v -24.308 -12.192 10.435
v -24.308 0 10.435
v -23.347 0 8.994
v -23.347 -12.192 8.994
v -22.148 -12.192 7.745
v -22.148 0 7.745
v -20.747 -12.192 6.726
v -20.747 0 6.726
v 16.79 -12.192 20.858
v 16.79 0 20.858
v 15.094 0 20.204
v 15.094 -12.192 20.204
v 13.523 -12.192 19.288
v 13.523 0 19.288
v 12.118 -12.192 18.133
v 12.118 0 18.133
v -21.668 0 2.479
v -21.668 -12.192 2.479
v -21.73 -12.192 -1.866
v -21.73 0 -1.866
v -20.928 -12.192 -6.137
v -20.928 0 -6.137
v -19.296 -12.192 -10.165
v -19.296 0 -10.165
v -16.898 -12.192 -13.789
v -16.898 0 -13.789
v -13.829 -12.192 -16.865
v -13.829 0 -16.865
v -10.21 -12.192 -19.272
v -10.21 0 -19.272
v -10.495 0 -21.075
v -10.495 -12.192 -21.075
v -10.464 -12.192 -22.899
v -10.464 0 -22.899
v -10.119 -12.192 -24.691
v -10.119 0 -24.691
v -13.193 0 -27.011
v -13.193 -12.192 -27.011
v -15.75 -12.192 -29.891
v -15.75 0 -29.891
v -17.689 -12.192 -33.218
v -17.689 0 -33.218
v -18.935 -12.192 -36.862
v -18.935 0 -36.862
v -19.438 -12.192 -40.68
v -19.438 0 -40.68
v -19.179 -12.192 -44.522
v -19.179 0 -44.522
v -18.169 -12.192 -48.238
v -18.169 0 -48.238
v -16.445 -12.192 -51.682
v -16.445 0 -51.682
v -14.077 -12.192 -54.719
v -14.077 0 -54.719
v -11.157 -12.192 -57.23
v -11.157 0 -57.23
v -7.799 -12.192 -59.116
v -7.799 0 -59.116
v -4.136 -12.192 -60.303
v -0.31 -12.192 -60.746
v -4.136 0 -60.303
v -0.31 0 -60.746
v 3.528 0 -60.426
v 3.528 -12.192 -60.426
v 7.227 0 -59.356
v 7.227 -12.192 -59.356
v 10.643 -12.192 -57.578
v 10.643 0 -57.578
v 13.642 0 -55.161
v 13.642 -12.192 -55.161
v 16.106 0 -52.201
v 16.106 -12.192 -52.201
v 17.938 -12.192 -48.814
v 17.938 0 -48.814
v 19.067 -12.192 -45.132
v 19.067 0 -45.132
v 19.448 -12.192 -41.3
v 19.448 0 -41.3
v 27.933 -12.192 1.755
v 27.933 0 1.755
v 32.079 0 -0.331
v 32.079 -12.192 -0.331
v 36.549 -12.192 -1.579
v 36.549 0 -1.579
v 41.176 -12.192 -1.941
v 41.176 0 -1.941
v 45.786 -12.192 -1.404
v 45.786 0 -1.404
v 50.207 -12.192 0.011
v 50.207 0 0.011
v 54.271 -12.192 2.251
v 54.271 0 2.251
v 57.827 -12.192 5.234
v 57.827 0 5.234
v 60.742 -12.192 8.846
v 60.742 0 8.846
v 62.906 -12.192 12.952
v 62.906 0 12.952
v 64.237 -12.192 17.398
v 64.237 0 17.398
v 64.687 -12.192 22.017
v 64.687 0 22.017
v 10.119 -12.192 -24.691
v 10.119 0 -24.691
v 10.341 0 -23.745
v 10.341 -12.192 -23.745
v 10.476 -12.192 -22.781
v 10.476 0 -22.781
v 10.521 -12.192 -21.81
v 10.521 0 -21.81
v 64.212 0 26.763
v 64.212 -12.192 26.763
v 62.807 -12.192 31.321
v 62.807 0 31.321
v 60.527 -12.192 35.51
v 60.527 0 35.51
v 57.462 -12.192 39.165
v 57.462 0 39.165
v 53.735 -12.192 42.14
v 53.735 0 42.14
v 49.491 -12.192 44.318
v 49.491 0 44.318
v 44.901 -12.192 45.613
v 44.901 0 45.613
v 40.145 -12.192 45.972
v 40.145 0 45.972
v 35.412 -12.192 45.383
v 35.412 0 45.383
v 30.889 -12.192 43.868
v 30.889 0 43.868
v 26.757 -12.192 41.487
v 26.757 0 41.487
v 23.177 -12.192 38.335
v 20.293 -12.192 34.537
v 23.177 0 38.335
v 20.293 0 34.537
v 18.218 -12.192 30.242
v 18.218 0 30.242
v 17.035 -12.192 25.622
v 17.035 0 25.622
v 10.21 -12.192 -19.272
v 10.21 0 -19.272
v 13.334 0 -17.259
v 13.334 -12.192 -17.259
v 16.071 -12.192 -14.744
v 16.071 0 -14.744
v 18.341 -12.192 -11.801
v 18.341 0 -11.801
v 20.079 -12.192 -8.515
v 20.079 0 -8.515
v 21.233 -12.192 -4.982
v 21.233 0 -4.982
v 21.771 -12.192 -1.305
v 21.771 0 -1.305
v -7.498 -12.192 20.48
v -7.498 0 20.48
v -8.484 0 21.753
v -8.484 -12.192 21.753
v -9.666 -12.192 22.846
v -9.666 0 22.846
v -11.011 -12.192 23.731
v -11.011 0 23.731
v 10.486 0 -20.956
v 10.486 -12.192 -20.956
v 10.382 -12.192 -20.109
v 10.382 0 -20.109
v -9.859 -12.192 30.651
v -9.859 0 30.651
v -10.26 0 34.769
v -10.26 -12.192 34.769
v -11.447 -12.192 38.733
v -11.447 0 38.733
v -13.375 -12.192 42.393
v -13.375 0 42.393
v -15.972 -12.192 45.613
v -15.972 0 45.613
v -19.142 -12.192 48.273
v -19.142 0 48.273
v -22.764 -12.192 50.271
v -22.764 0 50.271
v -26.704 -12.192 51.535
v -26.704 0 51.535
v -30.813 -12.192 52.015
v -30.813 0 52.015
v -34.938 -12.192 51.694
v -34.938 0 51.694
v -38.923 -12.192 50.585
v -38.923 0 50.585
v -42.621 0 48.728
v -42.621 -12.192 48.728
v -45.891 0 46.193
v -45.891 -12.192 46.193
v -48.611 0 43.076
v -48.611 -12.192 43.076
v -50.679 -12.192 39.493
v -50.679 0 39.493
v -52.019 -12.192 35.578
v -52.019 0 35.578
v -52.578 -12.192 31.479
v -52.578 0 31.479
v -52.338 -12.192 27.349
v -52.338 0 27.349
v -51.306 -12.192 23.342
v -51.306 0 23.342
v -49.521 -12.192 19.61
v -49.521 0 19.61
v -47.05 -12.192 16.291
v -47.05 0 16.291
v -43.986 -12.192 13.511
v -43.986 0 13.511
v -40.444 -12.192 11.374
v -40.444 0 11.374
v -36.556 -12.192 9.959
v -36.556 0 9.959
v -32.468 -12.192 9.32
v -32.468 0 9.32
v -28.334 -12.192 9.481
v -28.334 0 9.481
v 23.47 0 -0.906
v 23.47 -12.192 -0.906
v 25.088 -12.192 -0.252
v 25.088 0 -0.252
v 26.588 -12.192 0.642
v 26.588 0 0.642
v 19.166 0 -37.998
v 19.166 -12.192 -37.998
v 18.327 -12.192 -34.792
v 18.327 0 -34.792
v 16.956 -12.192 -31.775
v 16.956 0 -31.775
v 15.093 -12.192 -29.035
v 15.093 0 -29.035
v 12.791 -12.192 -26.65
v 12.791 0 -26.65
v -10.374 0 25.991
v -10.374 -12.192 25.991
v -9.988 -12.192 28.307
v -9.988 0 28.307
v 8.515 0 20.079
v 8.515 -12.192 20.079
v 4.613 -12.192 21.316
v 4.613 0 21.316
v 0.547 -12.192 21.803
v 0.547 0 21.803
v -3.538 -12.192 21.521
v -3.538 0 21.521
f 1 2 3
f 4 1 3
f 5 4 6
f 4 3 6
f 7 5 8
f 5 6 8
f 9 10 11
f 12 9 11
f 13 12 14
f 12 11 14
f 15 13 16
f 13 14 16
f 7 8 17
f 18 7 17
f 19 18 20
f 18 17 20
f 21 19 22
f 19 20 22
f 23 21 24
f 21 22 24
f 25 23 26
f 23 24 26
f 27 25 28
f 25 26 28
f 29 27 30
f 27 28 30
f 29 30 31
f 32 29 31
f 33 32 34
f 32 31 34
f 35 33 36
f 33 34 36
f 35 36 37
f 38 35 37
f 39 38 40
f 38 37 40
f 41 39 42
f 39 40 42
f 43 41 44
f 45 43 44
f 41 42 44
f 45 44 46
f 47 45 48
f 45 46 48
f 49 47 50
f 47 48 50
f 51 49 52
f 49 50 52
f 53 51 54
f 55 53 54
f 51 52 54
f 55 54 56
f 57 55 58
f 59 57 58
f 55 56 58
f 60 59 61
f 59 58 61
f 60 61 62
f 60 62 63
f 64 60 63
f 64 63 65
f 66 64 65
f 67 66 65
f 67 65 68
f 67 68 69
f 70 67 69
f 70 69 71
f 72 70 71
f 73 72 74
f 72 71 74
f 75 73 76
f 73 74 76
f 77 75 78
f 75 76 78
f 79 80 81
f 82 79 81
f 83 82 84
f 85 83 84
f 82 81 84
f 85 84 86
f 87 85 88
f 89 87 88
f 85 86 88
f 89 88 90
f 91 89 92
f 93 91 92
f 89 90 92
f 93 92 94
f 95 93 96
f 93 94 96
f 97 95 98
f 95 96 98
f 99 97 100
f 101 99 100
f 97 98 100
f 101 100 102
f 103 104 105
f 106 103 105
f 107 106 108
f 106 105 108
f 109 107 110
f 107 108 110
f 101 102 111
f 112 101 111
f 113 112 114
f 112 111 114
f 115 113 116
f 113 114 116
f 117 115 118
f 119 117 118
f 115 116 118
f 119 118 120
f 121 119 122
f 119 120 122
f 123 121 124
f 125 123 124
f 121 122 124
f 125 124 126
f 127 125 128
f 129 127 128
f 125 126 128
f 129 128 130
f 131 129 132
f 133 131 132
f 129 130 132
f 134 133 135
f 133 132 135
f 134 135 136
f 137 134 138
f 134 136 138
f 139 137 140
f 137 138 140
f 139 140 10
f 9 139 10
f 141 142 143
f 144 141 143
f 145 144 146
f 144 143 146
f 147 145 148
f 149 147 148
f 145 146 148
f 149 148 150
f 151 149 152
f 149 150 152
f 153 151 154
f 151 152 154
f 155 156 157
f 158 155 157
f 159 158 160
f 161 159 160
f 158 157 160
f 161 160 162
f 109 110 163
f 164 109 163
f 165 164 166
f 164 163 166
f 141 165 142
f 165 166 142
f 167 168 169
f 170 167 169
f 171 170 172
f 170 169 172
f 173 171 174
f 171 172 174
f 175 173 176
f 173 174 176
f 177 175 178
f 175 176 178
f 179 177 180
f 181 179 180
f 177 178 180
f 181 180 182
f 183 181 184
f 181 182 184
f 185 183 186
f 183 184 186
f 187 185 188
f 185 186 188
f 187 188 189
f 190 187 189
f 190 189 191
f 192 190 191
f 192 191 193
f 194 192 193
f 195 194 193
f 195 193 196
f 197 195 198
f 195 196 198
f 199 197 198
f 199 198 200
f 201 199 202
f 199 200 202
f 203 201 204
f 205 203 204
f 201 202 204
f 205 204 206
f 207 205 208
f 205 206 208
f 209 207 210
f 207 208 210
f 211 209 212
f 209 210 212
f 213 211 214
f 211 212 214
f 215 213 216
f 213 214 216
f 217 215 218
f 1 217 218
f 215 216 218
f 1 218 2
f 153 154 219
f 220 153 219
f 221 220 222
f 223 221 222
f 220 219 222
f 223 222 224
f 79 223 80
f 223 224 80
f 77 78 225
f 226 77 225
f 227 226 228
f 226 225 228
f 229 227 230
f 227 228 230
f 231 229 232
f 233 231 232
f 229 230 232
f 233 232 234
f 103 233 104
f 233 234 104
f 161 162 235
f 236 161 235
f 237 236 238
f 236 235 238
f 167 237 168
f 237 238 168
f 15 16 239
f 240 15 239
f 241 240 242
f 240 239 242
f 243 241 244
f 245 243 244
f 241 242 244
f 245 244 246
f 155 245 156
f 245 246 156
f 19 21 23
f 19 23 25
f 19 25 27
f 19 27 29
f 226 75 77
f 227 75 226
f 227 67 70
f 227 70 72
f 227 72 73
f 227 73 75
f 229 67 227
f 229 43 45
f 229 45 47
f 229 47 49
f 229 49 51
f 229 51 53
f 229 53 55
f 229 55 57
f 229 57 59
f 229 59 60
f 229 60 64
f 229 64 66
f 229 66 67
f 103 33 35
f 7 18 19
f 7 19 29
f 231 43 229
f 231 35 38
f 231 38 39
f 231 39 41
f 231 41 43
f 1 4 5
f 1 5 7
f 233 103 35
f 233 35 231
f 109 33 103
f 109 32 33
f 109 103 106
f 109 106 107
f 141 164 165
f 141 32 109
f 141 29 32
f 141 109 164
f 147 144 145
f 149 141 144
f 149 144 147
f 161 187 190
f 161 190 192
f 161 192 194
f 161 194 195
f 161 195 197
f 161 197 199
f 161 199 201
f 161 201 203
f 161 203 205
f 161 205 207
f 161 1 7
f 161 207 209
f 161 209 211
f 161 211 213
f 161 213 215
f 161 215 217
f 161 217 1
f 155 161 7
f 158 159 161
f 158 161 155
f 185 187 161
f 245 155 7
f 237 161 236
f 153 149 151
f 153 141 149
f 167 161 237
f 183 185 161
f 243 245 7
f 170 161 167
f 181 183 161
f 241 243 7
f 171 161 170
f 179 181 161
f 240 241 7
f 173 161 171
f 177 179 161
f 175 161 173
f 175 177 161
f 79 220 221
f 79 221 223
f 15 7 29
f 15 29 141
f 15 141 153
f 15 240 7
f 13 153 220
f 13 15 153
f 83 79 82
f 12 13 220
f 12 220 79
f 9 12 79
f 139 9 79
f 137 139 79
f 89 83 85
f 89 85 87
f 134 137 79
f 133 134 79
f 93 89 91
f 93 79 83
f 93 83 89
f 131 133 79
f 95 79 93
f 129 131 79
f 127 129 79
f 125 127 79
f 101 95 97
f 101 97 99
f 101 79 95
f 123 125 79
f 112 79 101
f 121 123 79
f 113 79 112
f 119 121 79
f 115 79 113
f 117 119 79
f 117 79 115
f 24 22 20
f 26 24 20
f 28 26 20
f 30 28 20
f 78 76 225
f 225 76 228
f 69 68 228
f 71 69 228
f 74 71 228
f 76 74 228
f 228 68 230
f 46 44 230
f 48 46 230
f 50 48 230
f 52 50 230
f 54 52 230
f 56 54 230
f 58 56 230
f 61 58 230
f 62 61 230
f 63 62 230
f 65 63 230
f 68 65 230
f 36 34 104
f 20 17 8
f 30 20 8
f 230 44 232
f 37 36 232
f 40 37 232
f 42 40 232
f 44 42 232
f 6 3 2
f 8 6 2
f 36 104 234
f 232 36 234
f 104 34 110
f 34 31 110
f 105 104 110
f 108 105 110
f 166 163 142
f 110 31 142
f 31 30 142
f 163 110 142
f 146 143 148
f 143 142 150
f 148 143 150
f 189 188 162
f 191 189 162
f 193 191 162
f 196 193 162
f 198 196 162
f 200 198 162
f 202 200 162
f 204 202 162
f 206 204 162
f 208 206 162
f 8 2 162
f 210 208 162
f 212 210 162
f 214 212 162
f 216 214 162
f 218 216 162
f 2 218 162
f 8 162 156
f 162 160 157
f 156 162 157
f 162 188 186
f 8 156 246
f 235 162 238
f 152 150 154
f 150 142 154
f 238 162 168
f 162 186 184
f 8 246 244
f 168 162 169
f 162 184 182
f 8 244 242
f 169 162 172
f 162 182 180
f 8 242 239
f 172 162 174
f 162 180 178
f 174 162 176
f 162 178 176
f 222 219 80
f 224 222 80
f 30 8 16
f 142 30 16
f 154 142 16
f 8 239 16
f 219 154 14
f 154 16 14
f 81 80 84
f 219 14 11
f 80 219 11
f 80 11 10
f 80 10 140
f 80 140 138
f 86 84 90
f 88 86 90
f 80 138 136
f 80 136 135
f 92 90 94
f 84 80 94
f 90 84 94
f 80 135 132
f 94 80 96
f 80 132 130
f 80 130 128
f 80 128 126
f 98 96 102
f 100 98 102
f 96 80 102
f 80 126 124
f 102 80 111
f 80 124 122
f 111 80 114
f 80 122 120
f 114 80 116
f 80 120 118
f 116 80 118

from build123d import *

# Parameters (mm, degrees)
F0_R     = 11.2833128168
F0_R_2   = 10.6488130987
F0_R_3   = 7.8884517035
F1_DEPTH = 12.192


with BuildPart() as f1:
    # F0 (on Front) → F1 (new body)
    with BuildSketch(Plane.XZ):
        with BuildLine():
            ThreePointArc((64.6868256307, 22.0171418041), (40.1449761113, 45.972446089), (16.7902312728, 20.8584086847))
            ThreePointArc((16.7902312728, 20.8584086847), (26.8358189915, 19.0661999212), (31.4093265462, 9.9443101218))
            ThreePointArc((31.4093265462, 9.9443101218), (30.5041655093, 5.4958673793), (27.9326293781, 1.754856652))
            ThreePointArc((27.9326293781, 1.7548566521), (52.2932061526, 1.0324381979), (64.6868256307, 22.0171418041))
        make_face()
        with Locations((40.7245121896, 22.0171418041)):
            Circle(F0_R, mode=Mode.SUBTRACT)
        with BuildLine():
            ThreePointArc((-24.308387046, 10.4348676669), (-22.6363387801, 22.0599619939), (-11.011095527, 23.7309745073))
            ThreePointArc((-11.011095527, 23.7309745073), (-10.1492949348, 27.1435552972), (-9.8594061629, 30.6513141841))
            ThreePointArc((-9.8594061629, 30.6513141841), (-48.6108677185, 43.0758640586), (-24.308387046, 10.4348676669))
        make_face()
        with Locations((-31.2269255519, 30.6513141841)):
            Circle(F0_R_2, mode=Mode.SUBTRACT)
        with BuildLine():
            ThreePointArc((10.1185107772, -24.6914563469), (0, -32.330583777), (-10.1185107772, -24.6914563469))
            ThreePointArc((-10.1185107772, -24.6914563469), (-9.5248492378, -58.2562348148), (19.4481945814, -41.3001291454))
            ThreePointArc((19.4481945814, -41.3001291454), (16.9561056694, -31.7752799076), (10.1185107772, -24.6914563469))
        make_face()
        with Locations((0, -41.3001291454)):
            Circle(F0_R_3, mode=Mode.SUBTRACT)
        with BuildLine():
            ThreePointArc((21.7706513012, -1.3047494562), (9.830025267, 4.8813588587), (12.1182372643, 18.1331727733))
            ThreePointArc((12.1182372643, 18.1331727733), (2.5912950244, 21.6552261433), (-7.4976775725, 20.4804409191))
            ThreePointArc((-7.4976775725, 20.4804409191), (-6.3141445246, 17.9210524787), (-5.9084352697, 15.1306009623))
            ThreePointArc((-5.9084352697, 15.1306009623), (-10.8782191013, 6.6041327124), (-20.7465769258, 6.7263047123))
            ThreePointArc((-20.7465769258, 6.7263047123), (-20.2128863485, -8.1916332123), (-10.2102536974, -19.2721132379))
            ThreePointArc((-10.2102536974, -19.2721132379), (0, -11.2888444275), (10.2102536974, -19.2721132379))
            ThreePointArc((10.2102536974, -19.2721132379), (18.3412407282, -11.8009541043), (21.7706513012, -1.3047494562))
        make_face()
        with Locations((40.7245121896, 22.0171418041)):
            Circle(F0_R)
        with Locations((-31.2269255519, 30.6513141841)):
            Circle(F0_R_2)
        with Locations((0, -41.3001291454)):
            Circle(F0_R_3)
        with BuildLine():
            ThreePointArc((31.4093265462, 9.9443101218), (26.8358189915, 19.0661999212), (16.7902312728, 20.8584086847))
            ThreePointArc((16.7902312728, 20.8584086847), (20.0257392642, 9.9443101218), (27.9326293781, 1.7548566521))
            ThreePointArc((27.9326293781, 1.754856652), (30.5041655093, 5.4958673793), (31.4093265462, 9.9443101218))
        make_face()
        with BuildLine():
            ThreePointArc((21.7706513012, -1.3047494562), (21.7999462146, -0.6526670372), (21.8097141022, 0))
            ThreePointArc((21.8097141022, 0), (19.2348501343, 10.2802806154), (12.1182372643, 18.1331727733))
            ThreePointArc((12.1182372643, 18.1331727733), (9.830025267, 4.8813588587), (21.7706513012, -1.3047494562))
        make_face()
        with BuildLine():
            ThreePointArc((-10.2102536974, -19.2721132379), (0, -21.8097141022), (10.2102536974, -19.2721132379))
            ThreePointArc((10.2102536974, -19.2721132379), (0, -11.2888444275), (-10.2102536974, -19.2721132379))
        make_face()
        with BuildLine():
            ThreePointArc((10.1185107772, -24.6914563469), (0, -21.851934564), (-10.1185107772, -24.6914563469))
            ThreePointArc((-10.1185107772, -24.6914563469), (0, -32.330583777), (10.1185107772, -24.6914563469))
        make_face()
        with BuildLine():
            ThreePointArc((-5.9084352697, 15.1306009623), (-6.3141445246, 17.9210524787), (-7.4976775725, 20.4804409191))
            ThreePointArc((-7.4976775725, 20.4804409191), (-15.7075950973, 15.1306009623), (-20.7465769258, 6.7263047123))
            ThreePointArc((-20.7465769258, 6.7263047123), (-10.8782191013, 6.6041327124), (-5.9084352697, 15.1306009623))
        make_face()
        with BuildLine():
            ThreePointArc((-24.308387046, 10.4348676669), (-16.1184807885, 15.5415232633), (-11.011095527, 23.7309745073))
            ThreePointArc((-11.011095527, 23.7309745073), (-22.6363387801, 22.0599619939), (-24.308387046, 10.4348676669))
        make_face()
        with BuildLine():
            ThreePointArc((12.1182372643, 18.1331727733), (19.2348501343, 10.2802806154), (21.8097141022, 0))
            ThreePointArc((21.8097141022, 0), (21.7999462146, -0.6526670372), (21.7706513012, -1.3047494562))
            ThreePointArc((21.7706513012, -1.3047494562), (25.0883096167, -0.2515930178), (27.9326293781, 1.754856652))
            ThreePointArc((27.9326293781, 1.7548566521), (20.0257392642, 9.9443101218), (16.7902312728, 20.8584086847))
            ThreePointArc((16.7902312728, 20.8584086847), (14.2900269624, 19.7772986702), (12.1182372643, 18.1331727733))
        make_face()
        with BuildLine():
            ThreePointArc((-20.7465769258, 6.7263047123), (-15.7075950973, 15.1306009623), (-7.4976775725, 20.4804409191))
            ThreePointArc((-7.4976775725, 20.4804409191), (-9.0528680022, 22.323523916), (-11.011095527, 23.7309745073))
            ThreePointArc((-11.011095527, 23.7309745073), (-16.1184807885, 15.5415232633), (-24.308387046, 10.4348676669))
            ThreePointArc((-24.308387046, 10.4348676669), (-22.7750710945, 8.3427945158), (-20.7465769258, 6.7263047123))
        make_face()
        with BuildLine():
            ThreePointArc((10.5208696747, -21.8097141022), (10.4429269654, -20.5314437443), (10.2102536974, -19.2721132379))
            ThreePointArc((10.2102536974, -19.2721132379), (0, -21.8097141022), (-10.2102536974, -19.2721132379))
            ThreePointArc((-10.2102536974, -19.2721132379), (-10.5193624426, -21.9877941777), (-10.1185107772, -24.6914563469))
            ThreePointArc((-10.1185107772, -24.6914563469), (0, -21.851934564), (10.1185107772, -24.6914563469))
            ThreePointArc((10.1185107772, -24.6914563469), (10.4197944294, -23.2645621224), (10.5208696747, -21.8097141022))
        make_face()
    extrude(amount=F1_DEPTH)


solid = f1.part
